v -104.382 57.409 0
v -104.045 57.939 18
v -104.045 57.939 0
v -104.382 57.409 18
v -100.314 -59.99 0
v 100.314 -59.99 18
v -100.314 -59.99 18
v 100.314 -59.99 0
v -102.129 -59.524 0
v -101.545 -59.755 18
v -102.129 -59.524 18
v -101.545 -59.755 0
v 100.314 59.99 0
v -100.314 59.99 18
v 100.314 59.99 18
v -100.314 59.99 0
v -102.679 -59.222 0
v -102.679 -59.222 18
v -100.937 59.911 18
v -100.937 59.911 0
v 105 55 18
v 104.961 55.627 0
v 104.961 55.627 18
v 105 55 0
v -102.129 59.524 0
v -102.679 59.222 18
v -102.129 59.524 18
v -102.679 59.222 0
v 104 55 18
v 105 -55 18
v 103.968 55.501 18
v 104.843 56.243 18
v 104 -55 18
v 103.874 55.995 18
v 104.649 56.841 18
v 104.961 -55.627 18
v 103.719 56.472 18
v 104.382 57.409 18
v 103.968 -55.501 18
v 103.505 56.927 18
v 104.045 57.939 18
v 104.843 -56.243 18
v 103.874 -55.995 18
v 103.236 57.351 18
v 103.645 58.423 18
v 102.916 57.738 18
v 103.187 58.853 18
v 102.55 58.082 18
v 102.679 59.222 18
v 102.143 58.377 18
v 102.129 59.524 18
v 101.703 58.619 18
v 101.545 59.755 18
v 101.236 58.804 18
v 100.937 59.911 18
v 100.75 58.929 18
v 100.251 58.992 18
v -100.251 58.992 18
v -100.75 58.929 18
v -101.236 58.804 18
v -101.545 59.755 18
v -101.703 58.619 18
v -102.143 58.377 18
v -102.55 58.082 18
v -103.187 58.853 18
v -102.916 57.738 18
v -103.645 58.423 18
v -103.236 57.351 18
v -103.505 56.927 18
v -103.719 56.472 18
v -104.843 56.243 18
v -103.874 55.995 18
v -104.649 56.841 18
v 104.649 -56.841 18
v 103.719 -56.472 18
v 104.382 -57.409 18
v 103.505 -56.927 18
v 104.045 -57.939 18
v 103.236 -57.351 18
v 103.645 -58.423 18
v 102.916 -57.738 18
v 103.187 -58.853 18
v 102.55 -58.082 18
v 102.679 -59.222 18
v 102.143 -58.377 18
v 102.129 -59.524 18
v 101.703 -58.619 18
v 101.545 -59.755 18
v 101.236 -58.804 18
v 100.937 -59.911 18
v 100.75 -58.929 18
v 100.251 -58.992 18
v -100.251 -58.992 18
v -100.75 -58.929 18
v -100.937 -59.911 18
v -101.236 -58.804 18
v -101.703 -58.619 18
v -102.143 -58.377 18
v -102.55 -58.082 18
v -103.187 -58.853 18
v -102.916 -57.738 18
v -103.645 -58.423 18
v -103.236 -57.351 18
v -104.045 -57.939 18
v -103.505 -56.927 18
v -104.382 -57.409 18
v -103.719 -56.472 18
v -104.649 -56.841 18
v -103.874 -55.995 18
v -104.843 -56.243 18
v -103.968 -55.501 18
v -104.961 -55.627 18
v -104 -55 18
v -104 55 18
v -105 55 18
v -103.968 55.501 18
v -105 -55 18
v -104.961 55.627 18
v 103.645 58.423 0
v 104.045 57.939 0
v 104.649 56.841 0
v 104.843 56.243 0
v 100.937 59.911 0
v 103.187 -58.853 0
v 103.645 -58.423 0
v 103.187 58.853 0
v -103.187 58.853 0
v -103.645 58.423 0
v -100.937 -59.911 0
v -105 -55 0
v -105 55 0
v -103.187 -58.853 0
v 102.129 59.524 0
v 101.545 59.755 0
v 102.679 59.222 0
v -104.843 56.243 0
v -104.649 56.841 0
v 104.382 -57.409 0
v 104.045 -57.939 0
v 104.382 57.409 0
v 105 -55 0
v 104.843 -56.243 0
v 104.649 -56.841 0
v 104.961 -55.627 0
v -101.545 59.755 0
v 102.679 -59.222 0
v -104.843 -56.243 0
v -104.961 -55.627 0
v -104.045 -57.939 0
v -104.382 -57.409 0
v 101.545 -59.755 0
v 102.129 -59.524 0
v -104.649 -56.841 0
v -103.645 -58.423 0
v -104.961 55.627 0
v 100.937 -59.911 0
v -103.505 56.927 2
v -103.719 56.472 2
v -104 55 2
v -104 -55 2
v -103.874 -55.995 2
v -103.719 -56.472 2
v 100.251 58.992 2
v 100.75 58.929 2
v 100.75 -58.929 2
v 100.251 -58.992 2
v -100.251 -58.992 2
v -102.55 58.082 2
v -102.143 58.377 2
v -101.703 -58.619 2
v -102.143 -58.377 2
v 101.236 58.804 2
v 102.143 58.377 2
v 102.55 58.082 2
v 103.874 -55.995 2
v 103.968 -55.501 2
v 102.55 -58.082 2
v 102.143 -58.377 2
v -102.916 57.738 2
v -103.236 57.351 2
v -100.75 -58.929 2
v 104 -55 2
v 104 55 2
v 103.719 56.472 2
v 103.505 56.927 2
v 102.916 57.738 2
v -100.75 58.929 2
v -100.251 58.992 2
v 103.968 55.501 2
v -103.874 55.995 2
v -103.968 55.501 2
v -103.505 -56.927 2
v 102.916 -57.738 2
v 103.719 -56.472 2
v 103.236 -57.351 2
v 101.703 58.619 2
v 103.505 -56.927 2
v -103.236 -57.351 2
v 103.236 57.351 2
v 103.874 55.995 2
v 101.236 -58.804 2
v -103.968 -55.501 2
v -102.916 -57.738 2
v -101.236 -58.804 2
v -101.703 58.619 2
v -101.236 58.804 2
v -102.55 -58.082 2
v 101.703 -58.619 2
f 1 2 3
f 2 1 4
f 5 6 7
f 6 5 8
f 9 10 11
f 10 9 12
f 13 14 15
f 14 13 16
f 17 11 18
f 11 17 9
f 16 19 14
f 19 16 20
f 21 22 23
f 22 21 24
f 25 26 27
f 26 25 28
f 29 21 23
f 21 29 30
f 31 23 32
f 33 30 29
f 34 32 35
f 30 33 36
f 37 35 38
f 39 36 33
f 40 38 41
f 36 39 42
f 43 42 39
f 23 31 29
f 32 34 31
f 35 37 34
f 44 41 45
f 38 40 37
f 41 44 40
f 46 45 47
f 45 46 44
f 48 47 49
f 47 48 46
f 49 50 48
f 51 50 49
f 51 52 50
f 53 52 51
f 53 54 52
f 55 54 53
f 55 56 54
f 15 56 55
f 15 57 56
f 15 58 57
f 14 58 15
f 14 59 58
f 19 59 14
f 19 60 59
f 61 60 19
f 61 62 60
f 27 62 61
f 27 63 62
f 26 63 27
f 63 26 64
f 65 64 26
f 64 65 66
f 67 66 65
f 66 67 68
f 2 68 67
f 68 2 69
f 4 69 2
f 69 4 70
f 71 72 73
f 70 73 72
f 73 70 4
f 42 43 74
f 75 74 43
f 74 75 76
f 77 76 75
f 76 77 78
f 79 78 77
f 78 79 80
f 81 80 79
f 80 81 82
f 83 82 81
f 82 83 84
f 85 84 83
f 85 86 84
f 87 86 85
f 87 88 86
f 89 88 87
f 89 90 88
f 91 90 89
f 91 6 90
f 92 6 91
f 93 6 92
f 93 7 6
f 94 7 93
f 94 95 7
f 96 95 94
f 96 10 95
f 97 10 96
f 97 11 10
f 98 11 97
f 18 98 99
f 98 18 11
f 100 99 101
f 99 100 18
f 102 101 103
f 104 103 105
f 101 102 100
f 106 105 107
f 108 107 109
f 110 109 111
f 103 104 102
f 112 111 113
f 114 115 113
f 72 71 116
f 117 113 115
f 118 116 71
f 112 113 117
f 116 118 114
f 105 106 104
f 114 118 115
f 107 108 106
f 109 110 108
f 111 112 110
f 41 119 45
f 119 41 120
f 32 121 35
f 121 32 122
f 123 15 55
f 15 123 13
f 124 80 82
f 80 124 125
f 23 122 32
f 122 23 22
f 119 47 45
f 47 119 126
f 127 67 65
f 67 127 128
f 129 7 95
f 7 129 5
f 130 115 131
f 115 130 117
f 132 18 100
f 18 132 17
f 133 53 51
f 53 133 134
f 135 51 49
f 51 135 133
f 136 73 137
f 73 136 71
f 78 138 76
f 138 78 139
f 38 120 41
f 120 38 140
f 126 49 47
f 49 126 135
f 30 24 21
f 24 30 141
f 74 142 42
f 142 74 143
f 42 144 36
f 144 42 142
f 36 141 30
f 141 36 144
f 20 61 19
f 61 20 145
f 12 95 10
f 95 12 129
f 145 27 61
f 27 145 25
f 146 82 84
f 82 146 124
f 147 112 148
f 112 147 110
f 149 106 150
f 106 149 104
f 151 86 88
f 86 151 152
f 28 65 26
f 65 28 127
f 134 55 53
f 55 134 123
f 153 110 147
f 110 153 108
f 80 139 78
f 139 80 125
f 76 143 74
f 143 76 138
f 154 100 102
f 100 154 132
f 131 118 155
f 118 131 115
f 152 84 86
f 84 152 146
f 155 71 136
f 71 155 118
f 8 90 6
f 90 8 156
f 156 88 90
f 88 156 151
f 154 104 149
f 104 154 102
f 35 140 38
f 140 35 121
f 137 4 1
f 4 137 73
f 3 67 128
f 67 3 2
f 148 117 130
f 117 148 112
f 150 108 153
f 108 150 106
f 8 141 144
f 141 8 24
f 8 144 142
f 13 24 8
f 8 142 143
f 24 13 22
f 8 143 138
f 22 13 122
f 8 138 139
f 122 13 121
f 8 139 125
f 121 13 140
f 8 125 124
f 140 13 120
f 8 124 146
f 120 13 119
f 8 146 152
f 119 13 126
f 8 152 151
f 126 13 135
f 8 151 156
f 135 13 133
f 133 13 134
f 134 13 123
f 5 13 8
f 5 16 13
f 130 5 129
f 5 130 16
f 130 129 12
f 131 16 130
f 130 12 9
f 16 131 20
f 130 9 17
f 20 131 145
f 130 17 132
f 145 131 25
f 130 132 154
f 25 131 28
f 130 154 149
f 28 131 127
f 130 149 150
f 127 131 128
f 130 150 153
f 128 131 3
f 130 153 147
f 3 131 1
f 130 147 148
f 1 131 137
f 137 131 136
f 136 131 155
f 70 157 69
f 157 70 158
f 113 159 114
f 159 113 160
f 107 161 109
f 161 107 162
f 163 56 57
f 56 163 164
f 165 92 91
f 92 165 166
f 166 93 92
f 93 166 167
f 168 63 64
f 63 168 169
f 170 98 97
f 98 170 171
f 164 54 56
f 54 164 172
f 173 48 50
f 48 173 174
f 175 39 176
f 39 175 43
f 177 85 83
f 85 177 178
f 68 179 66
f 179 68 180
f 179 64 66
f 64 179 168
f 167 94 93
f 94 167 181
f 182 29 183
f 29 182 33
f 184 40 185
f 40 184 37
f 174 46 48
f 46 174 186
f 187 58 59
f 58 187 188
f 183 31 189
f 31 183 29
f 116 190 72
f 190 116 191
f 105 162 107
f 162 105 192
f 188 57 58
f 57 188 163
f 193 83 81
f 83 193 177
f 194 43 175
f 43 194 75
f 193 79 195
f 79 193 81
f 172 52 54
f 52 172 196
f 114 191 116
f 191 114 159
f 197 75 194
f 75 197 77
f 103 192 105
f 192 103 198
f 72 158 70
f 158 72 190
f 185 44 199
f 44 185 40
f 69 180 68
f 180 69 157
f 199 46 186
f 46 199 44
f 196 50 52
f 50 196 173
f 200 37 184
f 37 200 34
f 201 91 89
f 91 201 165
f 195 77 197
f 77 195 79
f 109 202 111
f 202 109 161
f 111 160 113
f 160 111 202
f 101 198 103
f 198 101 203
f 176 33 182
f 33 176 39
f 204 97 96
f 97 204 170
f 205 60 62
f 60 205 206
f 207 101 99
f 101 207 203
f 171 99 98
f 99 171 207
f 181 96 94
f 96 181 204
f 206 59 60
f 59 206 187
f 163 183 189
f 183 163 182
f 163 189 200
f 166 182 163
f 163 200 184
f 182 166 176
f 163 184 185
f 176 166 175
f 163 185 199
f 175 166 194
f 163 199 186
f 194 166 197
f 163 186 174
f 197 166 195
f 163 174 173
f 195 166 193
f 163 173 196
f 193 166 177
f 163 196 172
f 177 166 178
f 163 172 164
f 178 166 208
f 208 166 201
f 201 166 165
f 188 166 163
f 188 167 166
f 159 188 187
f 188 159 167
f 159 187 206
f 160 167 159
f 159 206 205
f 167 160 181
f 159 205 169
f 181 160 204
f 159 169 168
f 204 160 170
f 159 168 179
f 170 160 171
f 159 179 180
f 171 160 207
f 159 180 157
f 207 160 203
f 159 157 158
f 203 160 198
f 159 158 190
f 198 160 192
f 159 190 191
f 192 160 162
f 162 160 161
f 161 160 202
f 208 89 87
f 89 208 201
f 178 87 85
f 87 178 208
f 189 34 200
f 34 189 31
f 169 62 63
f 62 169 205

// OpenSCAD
$fn = 50;


difference() {
	union() {
		hull() {
			translate(v = [-100.0000000000, 55.0000000000, 0]) {
				cylinder(h = 18, r = 5);
			}
			translate(v = [100.0000000000, 55.0000000000, 0]) {
				cylinder(h = 18, r = 5);
			}
			translate(v = [-100.0000000000, -55.0000000000, 0]) {
				cylinder(h = 18, r = 5);
			}
			translate(v = [100.0000000000, -55.0000000000, 0]) {
				cylinder(h = 18, r = 5);
			}
		}
	}
	union() {
		translate(v = [0, 0, 2]) {
			hull() {
				translate(v = [-100.0000000000, 55.0000000000, 0]) {
					cylinder(h = 16, r = 4);
				}
				translate(v = [100.0000000000, 55.0000000000, 0]) {
					cylinder(h = 16, r = 4);
				}
				translate(v = [-100.0000000000, -55.0000000000, 0]) {
					cylinder(h = 16, r = 4);
				}
				translate(v = [100.0000000000, -55.0000000000, 0]) {
					cylinder(h = 16, r = 4);
				}
			}
		}
	}
}
